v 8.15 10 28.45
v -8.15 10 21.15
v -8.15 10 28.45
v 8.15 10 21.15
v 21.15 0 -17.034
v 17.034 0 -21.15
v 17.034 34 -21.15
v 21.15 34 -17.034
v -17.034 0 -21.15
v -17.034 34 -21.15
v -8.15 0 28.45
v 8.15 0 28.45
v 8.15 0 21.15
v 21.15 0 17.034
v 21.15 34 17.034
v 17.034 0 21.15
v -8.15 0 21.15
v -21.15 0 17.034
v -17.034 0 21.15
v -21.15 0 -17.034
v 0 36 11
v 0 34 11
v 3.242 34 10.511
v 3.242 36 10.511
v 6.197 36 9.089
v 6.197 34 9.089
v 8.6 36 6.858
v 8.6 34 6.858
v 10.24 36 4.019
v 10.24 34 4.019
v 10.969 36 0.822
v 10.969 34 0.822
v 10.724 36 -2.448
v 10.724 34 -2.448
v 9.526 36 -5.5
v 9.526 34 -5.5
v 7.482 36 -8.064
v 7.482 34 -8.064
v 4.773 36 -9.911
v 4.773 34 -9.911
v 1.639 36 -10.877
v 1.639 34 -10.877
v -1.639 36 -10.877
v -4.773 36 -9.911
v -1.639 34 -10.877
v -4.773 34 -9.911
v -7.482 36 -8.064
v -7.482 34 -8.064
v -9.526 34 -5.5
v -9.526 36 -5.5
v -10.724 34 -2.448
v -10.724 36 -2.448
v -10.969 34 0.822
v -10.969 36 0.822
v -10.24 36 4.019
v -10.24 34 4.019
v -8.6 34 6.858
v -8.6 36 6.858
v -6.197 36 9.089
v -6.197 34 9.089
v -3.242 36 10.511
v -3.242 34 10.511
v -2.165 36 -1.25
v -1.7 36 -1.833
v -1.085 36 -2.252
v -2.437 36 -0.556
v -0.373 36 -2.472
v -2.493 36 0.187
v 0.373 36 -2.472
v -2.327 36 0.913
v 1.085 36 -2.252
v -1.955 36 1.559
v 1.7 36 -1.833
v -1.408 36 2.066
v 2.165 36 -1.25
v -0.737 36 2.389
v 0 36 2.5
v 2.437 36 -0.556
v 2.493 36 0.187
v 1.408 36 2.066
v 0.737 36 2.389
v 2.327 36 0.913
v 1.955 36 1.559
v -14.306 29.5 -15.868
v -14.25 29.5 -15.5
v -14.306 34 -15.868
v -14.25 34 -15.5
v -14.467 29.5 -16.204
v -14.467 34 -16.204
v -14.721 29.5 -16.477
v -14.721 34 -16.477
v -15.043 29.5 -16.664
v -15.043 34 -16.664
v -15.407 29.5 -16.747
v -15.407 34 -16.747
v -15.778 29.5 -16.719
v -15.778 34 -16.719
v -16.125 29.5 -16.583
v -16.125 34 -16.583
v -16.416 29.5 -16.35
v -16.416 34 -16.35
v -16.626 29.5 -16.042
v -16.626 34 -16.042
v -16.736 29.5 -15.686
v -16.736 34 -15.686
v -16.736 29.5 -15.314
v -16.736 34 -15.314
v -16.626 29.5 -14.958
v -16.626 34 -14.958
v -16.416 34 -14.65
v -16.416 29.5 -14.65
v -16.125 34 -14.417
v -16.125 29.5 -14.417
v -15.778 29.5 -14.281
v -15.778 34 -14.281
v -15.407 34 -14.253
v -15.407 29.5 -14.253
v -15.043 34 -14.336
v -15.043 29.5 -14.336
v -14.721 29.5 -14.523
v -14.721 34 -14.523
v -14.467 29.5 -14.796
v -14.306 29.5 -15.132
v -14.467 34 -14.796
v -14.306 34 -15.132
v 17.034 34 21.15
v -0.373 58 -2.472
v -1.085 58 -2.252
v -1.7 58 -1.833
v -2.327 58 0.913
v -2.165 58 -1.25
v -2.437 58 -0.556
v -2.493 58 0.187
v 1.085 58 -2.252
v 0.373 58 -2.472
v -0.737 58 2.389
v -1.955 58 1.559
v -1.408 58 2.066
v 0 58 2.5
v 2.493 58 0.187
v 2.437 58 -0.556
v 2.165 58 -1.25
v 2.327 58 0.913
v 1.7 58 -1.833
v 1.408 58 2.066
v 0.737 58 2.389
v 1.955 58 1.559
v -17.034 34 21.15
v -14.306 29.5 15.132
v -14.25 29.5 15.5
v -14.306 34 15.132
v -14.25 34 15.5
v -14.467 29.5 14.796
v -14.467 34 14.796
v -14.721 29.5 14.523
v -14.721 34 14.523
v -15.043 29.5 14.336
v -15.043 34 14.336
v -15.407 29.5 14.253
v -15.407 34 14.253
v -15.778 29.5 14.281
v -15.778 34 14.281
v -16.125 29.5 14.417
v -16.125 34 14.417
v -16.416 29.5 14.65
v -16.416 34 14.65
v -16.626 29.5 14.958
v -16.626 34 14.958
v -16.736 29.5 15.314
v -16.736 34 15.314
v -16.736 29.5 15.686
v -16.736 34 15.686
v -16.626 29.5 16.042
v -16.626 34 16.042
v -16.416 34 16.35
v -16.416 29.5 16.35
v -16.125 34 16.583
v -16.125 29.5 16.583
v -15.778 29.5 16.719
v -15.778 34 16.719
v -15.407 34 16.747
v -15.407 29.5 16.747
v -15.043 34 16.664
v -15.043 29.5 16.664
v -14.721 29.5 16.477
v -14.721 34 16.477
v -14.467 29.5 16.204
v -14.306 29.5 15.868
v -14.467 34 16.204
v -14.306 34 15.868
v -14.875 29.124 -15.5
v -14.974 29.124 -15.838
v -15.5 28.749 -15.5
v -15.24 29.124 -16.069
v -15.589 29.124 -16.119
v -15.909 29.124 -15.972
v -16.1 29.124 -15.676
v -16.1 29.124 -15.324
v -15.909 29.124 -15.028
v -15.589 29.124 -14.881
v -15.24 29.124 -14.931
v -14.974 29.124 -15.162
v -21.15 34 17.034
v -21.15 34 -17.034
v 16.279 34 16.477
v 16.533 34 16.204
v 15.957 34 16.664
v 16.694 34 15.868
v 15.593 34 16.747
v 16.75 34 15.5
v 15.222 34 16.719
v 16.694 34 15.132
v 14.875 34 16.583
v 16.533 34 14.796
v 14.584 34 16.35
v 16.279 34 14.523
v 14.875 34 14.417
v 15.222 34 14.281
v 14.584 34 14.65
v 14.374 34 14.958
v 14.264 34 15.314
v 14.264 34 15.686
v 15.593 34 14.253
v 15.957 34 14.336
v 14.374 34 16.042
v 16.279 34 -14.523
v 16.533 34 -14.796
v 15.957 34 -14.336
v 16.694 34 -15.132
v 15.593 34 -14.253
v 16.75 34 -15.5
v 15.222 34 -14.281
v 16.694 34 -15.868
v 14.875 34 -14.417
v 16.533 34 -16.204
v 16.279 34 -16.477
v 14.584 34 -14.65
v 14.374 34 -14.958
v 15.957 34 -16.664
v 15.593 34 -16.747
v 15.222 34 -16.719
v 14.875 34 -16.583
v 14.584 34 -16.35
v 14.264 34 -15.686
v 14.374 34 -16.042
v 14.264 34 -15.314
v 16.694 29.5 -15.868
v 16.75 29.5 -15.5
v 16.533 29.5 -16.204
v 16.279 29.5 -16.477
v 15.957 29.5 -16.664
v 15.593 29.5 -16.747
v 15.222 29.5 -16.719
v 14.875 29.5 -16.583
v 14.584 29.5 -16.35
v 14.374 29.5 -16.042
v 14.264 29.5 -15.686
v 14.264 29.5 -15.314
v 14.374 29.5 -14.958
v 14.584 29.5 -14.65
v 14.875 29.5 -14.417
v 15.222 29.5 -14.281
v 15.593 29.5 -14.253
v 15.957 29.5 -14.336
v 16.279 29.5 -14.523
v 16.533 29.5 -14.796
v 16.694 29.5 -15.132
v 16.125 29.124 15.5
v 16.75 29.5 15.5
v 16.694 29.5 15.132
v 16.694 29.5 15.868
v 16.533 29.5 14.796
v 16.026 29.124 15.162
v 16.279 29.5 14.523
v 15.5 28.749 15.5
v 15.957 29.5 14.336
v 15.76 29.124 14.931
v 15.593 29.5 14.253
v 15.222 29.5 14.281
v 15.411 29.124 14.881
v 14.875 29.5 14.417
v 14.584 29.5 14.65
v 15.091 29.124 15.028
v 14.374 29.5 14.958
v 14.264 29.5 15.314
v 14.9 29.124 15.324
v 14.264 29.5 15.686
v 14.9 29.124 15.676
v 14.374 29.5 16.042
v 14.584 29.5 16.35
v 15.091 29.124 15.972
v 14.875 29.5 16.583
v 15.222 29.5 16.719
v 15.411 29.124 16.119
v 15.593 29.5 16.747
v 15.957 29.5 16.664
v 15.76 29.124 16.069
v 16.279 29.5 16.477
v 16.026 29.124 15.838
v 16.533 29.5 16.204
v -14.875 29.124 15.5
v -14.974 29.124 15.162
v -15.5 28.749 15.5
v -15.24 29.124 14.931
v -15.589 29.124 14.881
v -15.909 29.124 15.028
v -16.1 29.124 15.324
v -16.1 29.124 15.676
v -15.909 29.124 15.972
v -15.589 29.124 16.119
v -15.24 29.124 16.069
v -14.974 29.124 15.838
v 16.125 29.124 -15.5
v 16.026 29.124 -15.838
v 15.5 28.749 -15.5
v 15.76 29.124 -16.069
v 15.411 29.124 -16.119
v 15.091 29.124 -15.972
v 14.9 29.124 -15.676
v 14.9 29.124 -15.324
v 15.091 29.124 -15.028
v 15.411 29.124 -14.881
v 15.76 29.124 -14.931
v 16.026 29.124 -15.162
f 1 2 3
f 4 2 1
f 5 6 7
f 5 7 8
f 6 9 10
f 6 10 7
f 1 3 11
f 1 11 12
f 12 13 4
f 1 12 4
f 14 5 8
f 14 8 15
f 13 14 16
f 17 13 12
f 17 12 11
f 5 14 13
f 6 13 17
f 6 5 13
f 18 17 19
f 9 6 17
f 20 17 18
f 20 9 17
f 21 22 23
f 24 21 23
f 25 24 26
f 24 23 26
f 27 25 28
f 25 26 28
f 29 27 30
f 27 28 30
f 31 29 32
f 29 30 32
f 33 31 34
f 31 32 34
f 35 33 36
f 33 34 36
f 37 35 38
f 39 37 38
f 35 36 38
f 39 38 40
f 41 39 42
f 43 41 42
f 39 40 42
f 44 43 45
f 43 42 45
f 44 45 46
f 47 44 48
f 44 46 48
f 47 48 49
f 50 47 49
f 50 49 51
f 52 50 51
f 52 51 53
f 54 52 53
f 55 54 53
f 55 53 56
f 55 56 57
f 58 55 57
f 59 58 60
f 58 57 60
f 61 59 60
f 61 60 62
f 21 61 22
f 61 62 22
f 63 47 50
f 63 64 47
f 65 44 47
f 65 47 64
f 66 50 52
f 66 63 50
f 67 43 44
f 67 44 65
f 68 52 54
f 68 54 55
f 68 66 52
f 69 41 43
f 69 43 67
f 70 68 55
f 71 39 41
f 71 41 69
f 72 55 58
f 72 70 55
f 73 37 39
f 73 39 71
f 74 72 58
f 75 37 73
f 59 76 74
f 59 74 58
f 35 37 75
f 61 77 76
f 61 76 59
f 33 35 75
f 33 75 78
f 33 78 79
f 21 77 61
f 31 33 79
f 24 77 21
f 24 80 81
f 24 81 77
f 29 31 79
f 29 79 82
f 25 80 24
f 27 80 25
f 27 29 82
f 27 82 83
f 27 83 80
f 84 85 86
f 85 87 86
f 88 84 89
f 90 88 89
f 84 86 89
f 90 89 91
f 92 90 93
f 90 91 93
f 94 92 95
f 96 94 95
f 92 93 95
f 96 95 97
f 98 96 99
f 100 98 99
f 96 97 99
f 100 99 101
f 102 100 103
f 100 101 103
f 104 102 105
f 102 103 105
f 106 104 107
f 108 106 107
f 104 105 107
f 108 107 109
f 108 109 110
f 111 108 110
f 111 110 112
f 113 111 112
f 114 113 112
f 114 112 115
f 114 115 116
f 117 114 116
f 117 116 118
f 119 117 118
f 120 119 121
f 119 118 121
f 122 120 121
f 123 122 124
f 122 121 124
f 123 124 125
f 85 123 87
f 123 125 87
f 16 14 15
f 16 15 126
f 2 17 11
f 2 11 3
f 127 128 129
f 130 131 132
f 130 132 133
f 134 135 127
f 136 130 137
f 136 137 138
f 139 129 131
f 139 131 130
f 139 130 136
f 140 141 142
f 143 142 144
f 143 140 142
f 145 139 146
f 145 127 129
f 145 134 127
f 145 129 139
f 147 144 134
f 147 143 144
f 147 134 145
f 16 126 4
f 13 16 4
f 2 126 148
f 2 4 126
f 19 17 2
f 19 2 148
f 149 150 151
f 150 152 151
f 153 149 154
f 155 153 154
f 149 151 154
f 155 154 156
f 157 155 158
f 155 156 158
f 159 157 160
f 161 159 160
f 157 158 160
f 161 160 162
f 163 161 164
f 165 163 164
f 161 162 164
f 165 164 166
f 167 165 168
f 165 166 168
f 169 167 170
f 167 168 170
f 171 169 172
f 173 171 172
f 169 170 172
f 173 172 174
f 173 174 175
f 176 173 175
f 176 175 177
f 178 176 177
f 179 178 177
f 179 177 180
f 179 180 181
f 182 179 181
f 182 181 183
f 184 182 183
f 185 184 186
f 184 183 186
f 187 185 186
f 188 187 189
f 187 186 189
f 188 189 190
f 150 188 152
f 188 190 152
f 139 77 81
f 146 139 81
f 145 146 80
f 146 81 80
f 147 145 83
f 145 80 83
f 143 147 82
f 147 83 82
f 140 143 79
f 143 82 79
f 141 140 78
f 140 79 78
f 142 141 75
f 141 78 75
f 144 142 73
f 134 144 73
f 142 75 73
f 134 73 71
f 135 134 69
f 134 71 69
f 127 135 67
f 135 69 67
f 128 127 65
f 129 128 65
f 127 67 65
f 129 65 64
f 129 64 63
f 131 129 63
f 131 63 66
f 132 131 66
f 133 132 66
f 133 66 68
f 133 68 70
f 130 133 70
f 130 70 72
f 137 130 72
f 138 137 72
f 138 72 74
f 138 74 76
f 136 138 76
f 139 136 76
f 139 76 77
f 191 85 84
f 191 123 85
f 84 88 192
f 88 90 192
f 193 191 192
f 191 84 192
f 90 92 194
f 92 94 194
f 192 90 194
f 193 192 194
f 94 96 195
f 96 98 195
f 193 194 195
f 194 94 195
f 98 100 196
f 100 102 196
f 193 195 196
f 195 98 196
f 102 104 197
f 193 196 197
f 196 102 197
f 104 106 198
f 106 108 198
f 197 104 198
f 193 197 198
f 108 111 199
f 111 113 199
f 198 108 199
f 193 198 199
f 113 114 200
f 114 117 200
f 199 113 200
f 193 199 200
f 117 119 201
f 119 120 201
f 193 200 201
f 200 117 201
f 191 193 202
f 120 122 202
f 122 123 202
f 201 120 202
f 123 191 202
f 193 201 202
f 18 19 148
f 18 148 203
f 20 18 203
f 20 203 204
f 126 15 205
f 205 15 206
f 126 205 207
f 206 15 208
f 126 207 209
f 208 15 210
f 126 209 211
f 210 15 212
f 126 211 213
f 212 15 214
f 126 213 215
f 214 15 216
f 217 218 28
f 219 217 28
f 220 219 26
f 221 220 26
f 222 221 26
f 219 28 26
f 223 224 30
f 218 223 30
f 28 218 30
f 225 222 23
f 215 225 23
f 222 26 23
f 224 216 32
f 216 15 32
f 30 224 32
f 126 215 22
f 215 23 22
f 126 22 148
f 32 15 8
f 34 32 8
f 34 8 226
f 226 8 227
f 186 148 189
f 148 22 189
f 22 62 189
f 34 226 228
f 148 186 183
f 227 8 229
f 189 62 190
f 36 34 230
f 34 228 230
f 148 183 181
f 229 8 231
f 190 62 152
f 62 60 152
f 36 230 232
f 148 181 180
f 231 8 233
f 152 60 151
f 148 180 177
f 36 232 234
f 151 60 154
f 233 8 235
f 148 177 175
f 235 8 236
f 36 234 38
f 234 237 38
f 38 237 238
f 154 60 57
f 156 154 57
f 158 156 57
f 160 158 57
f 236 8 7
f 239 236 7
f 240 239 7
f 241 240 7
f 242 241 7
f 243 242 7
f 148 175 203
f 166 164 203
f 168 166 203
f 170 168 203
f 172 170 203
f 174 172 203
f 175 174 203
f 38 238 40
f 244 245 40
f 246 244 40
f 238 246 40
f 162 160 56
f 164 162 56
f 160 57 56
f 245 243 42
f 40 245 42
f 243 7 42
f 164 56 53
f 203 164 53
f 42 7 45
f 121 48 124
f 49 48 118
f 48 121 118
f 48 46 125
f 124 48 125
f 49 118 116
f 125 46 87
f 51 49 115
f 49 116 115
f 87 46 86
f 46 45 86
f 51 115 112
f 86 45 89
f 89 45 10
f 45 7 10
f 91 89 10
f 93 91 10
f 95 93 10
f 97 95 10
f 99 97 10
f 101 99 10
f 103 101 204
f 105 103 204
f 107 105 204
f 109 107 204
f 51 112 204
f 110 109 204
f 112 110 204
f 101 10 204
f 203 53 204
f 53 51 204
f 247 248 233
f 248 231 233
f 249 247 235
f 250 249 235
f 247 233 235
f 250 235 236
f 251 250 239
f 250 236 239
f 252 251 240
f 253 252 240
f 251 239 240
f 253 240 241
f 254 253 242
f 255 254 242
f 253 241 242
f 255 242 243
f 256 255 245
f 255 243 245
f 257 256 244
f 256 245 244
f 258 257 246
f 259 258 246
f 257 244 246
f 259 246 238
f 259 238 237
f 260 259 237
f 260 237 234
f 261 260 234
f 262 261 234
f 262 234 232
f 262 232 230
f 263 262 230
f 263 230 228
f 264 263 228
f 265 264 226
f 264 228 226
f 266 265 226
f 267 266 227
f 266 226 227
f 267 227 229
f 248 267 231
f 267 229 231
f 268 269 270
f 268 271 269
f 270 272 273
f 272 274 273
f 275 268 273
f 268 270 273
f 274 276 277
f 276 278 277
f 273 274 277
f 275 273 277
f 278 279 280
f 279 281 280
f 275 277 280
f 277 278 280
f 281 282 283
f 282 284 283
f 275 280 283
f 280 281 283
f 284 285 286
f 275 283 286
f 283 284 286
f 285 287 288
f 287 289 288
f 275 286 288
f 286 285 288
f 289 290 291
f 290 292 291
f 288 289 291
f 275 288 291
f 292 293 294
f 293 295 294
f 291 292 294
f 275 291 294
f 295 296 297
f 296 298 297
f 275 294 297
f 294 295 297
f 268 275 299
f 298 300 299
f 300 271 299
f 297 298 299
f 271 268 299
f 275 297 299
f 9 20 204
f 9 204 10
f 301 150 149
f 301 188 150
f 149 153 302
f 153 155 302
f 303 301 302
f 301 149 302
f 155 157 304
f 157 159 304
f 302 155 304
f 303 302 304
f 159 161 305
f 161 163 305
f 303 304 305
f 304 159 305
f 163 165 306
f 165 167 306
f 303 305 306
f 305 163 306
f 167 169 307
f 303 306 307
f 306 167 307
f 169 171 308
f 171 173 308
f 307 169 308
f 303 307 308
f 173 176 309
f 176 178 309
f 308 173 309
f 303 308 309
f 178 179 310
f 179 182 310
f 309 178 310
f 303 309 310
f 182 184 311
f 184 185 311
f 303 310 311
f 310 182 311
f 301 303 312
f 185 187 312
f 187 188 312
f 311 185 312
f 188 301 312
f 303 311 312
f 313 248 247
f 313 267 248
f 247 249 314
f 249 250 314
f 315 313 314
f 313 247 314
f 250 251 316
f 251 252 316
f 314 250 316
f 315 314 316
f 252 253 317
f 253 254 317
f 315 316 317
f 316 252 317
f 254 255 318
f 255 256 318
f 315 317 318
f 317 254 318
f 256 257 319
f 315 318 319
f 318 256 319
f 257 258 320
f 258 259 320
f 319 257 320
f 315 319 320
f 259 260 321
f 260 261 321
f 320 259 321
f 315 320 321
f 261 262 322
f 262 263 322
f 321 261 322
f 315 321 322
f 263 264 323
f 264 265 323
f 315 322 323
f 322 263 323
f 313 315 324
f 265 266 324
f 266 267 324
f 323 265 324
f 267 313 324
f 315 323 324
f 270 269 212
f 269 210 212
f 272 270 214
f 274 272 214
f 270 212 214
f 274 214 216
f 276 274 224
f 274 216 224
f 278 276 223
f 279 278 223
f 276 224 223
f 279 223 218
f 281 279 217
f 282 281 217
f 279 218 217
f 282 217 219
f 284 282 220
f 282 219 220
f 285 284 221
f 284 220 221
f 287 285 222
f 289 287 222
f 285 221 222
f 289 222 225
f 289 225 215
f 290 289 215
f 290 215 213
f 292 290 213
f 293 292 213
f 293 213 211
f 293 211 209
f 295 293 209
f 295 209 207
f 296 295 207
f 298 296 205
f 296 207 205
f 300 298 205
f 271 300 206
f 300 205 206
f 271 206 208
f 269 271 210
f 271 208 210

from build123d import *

# Parameters (mm, degrees)
BOSS_EXTRUDE1_DEPTH = 34
SKETCH2_R           = 11
BOSS_EXTRUDE2_DEPTH = 2
SKETCH3_R           = 2.5
BOSS_EXTRUDE3_DEPTH = 24
SKETCH8_W           = 16.3
SKETCH8_H           = 10
BOSS_EXTRUDE4_DEPTH = 7.3


# Read off the part's stored shape, not the designer's step: M3 Tapped Hole1
with BuildPart() as part:
    # Sketch1 → Boss-Extrude1 (new body)
    with BuildSketch(Plane(origin=(0, 0, 0), x_dir=(1, 0, 0), z_dir=(0, 1, 0))):
        Polygon((-17.033766184, 21.15), (17.033766184, 21.15), (21.15, 17.033766184), (21.15, -17.033766184), (17.033766184, -21.15), (-17.033766184, -21.15), (-21.15, -17.033766184), (-21.15, 17.033766184), align=None)
    extrude(amount=BOSS_EXTRUDE1_DEPTH)

    # Sketch2 → Boss-Extrude2 (add)
    with BuildSketch(Plane(origin=(0, 34, 0), x_dir=(1, 0, 0), z_dir=(0, 1, 0))):
        with Locations(Location((0, 0, 0), (0, 0, 270))):
            Circle(SKETCH2_R)
    extrude(amount=BOSS_EXTRUDE2_DEPTH)

    # Sketch3 → Boss-Extrude3 (add)
    with BuildSketch(Plane(origin=(0, 34, 0), x_dir=(1, 0, 0), z_dir=(0, 1, 0))):
        with Locations(Location((0, 0, 0), (0, 0, 270))):
            Circle(SKETCH3_R)
    extrude(amount=BOSS_EXTRUDE3_DEPTH)

    # M3 Tapped Hole1 outline → M3 Tapped Hole1 (revolve, cut)
    with BuildSketch(Plane(origin=(15.5, 0, -15.5), x_dir=(1, 0, 0), z_dir=(0, 0, 1))):
        Polygon((0, 34), (0, 28.748924226), (1.25, 29.5), (1.25, 34), align=None)
    revolve(axis=Axis((15.5, 0, -15.5), (0, 1, 0)), mode=Mode.SUBTRACT)

    # M3 Tapped Hole1 2 outline → M3 Tapped Hole1 2 (revolve, cut)
    with BuildSketch(Plane(origin=(-15.5, 0, 15.5), x_dir=(1, 0, 0), z_dir=(0, 0, 1))):
        Polygon((0, 34), (0, 28.748924226), (1.25, 29.5), (1.25, 34), align=None)
    revolve(axis=Axis((-15.5, 0, 15.5), (0, 1, 0)), mode=Mode.SUBTRACT)

    # M3 Tapped Hole1 3 outline → M3 Tapped Hole1 3 (revolve, cut)
    with BuildSketch(Plane(origin=(15.5, 0, 15.5), x_dir=(1, 0, 0), z_dir=(0, 0, 1))):
        Polygon((0, 34), (0, 28.748924226), (1.25, 29.5), (1.25, 34), align=None)
    revolve(axis=Axis((15.5, 0, 15.5), (0, 1, 0)), mode=Mode.SUBTRACT)

    # M3 Tapped Hole1 4 outline → M3 Tapped Hole1 4 (revolve, cut)
    with BuildSketch(Plane(origin=(-15.5, 0, -15.5), x_dir=(1, 0, 0), z_dir=(0, 0, 1))):
        Polygon((0, 34), (0, 28.748924226), (1.25, 29.5), (1.25, 34), align=None)
    revolve(axis=Axis((-15.5, 0, -15.5), (0, 1, 0)), mode=Mode.SUBTRACT)

    # Sketch8 → Boss-Extrude4 (add)
    with BuildSketch(Plane.XY.offset(21.15)):
        with Locations((0, 5)):
            Rectangle(SKETCH8_W, SKETCH8_H)
    extrude(amount=BOSS_EXTRUDE4_DEPTH)


solid = part.part
